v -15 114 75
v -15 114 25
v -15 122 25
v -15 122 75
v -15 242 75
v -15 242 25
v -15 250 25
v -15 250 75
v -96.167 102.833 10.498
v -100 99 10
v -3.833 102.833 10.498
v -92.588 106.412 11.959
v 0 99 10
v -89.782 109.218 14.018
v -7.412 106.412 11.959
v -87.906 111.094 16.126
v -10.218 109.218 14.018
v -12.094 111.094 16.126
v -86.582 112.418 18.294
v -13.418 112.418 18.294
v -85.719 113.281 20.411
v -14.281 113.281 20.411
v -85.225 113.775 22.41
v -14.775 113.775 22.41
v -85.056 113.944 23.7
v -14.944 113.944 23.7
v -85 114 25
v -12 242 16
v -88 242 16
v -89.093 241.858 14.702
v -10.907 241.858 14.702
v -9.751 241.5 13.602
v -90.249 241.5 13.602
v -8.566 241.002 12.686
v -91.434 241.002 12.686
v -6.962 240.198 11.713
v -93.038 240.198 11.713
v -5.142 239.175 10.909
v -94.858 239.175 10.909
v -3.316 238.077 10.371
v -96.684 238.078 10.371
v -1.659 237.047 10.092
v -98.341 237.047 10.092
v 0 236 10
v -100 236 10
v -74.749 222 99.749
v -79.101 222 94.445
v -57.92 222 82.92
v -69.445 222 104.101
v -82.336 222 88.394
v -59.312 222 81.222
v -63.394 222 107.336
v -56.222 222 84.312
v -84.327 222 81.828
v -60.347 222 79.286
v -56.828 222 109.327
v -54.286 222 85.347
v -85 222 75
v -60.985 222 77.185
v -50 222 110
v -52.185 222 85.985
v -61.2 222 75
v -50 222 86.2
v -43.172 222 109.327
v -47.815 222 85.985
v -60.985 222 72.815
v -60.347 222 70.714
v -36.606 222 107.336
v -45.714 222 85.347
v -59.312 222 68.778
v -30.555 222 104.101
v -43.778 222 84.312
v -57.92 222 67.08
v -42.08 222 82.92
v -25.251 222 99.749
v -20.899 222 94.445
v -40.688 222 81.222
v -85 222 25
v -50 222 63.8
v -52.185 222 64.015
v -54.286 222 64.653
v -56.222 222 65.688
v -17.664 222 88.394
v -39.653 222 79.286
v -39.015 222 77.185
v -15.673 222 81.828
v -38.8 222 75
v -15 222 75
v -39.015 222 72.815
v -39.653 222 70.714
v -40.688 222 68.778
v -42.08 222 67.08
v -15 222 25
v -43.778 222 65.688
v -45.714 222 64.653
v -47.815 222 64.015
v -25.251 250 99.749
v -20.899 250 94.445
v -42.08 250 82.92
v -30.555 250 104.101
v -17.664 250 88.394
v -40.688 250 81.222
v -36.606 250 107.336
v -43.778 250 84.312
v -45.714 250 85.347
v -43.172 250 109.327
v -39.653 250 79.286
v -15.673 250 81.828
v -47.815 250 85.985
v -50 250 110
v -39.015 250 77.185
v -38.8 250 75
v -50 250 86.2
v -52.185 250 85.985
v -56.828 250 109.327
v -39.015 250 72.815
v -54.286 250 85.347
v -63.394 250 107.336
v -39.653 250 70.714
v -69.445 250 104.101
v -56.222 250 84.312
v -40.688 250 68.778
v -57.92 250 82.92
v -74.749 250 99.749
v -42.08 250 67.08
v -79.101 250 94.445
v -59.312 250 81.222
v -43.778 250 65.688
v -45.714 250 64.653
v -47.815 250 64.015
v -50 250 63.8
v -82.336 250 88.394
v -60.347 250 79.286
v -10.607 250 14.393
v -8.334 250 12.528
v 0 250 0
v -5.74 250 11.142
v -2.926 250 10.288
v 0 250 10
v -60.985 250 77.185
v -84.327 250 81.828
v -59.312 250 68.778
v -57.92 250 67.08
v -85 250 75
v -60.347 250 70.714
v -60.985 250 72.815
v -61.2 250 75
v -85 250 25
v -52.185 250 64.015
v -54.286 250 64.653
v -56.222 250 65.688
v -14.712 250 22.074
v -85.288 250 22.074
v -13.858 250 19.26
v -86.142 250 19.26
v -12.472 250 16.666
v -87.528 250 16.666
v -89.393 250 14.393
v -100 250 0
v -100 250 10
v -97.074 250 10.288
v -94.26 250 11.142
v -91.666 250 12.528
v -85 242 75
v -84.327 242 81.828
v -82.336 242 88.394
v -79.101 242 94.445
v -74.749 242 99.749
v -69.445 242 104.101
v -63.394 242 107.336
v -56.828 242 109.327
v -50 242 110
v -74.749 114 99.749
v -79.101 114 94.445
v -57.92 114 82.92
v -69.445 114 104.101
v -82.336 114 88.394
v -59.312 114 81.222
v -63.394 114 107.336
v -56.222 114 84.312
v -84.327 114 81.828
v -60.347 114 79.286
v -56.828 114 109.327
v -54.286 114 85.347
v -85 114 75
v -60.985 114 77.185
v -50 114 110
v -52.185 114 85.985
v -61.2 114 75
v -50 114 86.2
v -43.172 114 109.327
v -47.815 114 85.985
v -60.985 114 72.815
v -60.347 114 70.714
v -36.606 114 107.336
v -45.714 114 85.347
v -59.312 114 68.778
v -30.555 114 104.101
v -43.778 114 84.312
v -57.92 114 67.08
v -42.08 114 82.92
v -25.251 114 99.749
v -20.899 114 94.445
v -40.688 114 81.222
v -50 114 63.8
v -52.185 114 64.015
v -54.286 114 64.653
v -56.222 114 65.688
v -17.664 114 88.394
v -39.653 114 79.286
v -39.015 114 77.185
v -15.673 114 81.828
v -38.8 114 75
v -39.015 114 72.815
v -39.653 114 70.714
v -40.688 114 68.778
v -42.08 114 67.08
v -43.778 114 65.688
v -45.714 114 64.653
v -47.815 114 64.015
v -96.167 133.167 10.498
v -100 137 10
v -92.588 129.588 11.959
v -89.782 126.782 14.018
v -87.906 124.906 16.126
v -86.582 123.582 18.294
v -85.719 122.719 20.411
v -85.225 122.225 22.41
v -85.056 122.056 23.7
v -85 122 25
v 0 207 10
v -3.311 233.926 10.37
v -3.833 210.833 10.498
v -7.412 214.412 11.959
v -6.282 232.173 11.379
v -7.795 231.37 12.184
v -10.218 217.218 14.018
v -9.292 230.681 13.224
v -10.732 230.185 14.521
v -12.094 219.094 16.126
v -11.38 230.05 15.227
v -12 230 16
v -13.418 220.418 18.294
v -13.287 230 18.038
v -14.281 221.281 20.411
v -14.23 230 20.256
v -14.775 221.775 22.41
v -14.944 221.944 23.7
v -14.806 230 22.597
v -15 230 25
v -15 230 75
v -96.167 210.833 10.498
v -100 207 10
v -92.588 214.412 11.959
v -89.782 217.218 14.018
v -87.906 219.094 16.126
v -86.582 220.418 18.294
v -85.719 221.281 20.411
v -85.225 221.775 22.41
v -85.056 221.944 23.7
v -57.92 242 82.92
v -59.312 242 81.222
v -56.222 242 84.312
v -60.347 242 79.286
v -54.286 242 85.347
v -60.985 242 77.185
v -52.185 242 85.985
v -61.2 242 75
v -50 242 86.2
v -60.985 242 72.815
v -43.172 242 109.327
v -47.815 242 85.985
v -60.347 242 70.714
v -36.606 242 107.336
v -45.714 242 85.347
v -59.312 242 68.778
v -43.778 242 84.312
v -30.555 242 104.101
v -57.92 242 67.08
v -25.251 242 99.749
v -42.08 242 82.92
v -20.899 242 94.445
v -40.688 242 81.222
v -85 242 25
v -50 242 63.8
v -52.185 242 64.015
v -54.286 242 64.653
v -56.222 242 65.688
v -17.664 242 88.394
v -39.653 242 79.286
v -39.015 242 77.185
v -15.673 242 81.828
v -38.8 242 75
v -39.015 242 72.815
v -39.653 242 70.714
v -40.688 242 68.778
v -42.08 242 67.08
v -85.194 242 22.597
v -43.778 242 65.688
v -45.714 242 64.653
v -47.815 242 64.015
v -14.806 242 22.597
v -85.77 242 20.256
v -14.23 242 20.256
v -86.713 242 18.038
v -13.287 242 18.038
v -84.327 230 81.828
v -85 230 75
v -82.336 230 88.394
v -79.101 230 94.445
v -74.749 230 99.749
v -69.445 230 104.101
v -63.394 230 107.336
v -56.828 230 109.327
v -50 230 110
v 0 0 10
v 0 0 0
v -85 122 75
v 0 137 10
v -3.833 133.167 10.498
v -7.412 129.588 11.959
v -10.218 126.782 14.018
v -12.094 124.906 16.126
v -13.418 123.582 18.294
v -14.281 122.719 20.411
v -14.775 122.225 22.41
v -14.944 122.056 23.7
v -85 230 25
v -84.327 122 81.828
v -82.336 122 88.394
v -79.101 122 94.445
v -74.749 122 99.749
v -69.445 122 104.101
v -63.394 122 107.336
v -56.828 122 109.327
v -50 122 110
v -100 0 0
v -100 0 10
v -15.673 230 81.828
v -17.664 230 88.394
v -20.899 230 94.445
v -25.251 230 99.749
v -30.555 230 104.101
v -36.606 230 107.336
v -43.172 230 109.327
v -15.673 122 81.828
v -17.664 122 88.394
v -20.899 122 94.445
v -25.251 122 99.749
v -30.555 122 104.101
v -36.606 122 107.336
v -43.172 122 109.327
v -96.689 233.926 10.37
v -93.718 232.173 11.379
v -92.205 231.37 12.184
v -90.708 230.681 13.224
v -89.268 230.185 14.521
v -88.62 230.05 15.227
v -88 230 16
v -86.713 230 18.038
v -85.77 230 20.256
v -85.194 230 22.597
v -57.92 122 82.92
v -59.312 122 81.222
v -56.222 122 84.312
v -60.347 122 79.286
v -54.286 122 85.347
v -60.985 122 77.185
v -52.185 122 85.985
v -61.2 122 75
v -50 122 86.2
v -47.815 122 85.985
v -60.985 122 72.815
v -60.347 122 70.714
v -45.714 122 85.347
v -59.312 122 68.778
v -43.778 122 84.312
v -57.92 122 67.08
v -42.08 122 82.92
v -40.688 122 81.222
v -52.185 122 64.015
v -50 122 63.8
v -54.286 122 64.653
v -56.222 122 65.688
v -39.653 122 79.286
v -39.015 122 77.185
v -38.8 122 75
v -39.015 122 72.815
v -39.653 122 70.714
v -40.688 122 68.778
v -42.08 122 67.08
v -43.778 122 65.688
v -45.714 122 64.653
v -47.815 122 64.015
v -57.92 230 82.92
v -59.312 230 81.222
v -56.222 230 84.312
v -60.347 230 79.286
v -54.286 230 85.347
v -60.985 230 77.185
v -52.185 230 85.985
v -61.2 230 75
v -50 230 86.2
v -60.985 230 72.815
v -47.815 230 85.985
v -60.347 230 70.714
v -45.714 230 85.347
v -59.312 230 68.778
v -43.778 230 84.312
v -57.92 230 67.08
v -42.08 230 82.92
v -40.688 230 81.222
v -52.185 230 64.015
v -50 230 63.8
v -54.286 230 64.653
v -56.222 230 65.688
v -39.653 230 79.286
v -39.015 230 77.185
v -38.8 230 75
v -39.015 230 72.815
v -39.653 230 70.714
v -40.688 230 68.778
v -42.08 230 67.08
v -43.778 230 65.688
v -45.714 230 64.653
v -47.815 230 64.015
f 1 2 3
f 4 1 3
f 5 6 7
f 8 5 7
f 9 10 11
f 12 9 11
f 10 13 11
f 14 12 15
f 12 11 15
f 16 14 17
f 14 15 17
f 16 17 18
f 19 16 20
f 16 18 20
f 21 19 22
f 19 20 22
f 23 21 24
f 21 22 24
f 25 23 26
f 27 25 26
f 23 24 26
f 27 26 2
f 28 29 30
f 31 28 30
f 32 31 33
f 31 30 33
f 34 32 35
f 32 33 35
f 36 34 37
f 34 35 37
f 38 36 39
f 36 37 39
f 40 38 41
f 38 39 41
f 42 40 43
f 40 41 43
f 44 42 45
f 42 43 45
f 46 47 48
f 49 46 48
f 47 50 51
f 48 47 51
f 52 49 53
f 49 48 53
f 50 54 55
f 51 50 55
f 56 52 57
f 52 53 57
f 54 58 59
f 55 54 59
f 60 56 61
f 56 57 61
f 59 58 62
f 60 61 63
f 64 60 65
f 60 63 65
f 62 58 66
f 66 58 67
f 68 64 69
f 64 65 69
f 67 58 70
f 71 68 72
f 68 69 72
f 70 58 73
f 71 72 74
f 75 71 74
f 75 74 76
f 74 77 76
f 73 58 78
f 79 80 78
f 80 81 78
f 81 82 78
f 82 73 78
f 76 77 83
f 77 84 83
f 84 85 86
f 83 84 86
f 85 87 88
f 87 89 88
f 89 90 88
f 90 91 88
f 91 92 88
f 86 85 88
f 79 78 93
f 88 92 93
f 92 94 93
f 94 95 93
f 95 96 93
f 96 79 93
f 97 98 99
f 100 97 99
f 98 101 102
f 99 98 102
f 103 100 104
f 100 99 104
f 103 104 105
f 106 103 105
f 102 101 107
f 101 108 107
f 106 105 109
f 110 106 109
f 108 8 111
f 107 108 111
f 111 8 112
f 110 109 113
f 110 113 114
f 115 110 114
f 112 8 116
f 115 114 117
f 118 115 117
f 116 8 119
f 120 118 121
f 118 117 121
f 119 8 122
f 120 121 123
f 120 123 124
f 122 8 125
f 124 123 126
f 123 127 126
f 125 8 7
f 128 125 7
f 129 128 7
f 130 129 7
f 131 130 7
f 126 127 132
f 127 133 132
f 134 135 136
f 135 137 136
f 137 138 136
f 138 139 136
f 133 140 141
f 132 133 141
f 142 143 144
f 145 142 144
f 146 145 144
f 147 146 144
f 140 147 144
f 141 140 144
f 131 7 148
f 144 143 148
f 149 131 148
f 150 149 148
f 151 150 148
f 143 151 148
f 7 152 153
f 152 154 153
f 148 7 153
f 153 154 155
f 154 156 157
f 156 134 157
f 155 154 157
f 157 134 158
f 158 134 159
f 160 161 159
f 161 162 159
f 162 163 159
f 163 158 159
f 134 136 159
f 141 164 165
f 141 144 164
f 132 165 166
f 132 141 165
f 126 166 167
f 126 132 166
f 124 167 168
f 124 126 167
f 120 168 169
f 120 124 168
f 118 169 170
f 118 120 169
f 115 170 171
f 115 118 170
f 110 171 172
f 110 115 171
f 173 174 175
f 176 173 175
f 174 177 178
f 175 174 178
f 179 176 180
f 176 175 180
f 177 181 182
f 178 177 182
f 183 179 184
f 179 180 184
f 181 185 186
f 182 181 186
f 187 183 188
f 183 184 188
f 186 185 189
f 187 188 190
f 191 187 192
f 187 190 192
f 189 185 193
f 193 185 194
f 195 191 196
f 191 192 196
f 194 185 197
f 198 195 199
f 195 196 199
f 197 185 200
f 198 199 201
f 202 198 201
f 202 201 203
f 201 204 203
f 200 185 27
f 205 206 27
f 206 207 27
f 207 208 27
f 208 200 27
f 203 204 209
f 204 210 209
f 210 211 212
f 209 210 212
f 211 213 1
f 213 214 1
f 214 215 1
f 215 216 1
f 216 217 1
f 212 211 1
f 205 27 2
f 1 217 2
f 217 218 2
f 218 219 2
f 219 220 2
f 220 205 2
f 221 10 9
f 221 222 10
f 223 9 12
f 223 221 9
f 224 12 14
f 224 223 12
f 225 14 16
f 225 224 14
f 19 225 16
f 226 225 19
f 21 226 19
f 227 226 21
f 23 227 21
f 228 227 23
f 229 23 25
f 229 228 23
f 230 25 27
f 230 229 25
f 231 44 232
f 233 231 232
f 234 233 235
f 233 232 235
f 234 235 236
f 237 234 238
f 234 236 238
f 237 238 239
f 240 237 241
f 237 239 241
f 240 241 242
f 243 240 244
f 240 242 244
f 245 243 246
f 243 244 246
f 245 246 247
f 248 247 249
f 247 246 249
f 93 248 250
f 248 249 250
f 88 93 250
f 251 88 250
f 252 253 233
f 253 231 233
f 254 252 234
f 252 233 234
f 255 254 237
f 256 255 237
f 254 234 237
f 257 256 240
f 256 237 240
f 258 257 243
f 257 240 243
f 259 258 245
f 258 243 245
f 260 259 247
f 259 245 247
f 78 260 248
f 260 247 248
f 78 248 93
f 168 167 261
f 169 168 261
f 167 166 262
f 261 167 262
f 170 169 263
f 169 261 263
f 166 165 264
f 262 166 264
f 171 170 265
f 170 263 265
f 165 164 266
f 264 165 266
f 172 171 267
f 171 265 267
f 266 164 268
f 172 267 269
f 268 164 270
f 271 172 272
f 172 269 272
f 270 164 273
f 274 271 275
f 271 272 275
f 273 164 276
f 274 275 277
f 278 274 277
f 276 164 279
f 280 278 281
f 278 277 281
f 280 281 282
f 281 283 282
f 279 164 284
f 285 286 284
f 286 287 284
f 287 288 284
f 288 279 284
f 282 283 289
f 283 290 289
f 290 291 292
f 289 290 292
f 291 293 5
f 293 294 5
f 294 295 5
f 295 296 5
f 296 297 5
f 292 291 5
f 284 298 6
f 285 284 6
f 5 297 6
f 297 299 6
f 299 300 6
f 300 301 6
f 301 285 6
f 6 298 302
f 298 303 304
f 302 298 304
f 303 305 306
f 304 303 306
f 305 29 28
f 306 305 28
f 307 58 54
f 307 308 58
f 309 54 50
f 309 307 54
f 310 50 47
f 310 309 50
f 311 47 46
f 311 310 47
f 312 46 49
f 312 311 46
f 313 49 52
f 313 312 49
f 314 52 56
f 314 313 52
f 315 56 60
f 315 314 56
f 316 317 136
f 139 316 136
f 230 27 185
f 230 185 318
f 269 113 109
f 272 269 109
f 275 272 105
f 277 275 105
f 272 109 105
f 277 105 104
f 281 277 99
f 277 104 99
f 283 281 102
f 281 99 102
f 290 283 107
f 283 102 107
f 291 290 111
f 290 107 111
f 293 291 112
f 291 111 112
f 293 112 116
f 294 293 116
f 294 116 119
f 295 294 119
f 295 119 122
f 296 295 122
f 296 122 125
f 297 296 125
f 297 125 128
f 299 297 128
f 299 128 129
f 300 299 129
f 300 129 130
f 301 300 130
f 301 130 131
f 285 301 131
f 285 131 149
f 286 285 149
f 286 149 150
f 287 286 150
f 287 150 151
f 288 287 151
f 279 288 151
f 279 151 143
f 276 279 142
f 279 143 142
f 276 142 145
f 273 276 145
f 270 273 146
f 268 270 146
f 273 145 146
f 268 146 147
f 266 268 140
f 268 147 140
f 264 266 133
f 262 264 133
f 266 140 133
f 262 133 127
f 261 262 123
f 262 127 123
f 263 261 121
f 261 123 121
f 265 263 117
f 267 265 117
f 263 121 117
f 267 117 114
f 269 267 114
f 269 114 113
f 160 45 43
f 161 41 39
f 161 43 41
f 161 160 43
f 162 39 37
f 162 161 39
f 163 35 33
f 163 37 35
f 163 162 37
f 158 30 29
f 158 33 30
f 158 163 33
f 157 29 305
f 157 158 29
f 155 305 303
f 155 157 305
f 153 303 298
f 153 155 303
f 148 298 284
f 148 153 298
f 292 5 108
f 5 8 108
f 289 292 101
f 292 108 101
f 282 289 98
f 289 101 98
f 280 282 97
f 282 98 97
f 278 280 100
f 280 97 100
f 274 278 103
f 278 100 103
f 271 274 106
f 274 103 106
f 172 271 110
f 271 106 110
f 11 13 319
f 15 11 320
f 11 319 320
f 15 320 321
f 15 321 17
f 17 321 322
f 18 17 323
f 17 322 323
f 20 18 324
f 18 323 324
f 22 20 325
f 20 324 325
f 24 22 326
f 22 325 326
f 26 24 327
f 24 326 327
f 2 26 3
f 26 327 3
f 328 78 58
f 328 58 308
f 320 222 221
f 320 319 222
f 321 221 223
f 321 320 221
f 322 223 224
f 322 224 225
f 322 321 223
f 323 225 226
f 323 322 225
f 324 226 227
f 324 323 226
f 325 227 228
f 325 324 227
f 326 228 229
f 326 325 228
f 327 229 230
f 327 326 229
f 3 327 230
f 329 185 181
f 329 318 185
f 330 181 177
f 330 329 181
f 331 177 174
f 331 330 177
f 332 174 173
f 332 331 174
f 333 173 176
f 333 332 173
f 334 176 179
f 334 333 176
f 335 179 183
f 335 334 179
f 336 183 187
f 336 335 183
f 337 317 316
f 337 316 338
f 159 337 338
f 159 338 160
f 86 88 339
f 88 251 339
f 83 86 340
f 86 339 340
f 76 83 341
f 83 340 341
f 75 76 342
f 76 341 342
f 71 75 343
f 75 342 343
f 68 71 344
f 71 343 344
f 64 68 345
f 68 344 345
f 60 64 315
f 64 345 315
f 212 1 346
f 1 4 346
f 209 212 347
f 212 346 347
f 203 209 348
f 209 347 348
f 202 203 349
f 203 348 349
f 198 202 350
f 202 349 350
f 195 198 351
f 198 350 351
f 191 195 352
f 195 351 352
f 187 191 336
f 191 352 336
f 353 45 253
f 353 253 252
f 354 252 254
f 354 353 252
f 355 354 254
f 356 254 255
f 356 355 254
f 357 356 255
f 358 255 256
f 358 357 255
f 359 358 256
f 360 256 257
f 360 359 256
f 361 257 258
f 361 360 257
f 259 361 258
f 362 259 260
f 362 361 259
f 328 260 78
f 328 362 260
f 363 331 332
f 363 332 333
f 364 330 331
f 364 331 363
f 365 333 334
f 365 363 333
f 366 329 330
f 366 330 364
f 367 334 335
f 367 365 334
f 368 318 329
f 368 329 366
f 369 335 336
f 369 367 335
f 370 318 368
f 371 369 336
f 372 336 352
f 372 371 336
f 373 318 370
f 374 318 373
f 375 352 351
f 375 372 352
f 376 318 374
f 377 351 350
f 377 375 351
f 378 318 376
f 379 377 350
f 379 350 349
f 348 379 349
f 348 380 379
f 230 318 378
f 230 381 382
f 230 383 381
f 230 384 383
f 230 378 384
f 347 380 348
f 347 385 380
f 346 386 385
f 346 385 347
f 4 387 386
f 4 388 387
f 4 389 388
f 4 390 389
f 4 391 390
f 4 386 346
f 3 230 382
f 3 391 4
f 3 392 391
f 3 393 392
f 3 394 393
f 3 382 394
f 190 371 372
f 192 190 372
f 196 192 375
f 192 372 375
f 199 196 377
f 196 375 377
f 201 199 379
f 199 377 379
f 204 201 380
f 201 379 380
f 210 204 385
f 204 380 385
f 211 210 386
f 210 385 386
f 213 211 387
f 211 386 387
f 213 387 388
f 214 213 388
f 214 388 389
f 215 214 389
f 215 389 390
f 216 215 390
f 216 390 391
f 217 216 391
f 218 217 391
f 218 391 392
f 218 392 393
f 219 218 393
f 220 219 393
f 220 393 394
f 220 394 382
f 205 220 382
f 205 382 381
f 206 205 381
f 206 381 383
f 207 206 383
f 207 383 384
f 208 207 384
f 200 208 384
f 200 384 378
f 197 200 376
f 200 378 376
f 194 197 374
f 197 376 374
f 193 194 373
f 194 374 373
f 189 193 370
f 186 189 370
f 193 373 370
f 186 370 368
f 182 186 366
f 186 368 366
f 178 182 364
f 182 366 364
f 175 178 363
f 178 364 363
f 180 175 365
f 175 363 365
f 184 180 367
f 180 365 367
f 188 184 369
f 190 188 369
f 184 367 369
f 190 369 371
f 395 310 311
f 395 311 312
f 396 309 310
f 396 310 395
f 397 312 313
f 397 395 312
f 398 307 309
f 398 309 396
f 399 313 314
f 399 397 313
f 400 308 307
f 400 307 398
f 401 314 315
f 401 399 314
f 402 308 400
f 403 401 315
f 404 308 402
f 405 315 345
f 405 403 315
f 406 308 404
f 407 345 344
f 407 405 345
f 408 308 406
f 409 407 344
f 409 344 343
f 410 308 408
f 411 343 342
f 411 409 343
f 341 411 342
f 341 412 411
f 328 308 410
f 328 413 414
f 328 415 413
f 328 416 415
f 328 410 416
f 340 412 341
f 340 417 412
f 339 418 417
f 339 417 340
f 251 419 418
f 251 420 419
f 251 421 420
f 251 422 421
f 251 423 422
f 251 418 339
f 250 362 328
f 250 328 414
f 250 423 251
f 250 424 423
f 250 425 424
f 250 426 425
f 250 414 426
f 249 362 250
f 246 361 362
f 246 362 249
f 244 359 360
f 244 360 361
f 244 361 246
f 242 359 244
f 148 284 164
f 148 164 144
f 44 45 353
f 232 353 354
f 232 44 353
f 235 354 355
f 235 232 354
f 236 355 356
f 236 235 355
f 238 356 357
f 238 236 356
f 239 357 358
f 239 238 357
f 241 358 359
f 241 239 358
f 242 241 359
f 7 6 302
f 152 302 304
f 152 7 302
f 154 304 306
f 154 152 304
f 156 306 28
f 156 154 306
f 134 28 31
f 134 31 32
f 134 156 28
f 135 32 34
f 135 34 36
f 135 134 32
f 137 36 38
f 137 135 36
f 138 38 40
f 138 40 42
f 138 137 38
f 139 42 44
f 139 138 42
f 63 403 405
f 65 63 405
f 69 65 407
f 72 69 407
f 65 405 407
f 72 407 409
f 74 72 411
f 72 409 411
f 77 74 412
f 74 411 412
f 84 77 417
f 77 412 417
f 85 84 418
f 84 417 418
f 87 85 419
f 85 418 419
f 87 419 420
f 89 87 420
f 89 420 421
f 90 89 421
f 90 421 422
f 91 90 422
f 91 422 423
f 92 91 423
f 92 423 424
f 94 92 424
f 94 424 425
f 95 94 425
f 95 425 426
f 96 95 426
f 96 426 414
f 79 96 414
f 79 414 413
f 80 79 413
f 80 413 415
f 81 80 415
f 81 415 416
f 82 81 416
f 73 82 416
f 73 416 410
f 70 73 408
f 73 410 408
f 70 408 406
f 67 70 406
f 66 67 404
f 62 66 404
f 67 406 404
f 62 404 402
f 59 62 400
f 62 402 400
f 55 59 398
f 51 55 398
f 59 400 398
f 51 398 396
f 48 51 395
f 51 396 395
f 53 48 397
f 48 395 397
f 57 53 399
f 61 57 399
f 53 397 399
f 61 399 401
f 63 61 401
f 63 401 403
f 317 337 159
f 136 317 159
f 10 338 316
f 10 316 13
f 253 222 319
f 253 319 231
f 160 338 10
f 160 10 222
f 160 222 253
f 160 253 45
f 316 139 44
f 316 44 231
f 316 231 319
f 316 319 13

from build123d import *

# Parameters (mm, degrees)
ESQUISSE1_W             = 250
ESQUISSE1_H             = 100
BOSS_EXTRU_1_DEPTH      = 10
ESQUISSE2_W             = 70
ESQUISSE2_H             = 8
BOSS_EXTRU_2_DEPTH      = 100
CONG_1_R                = 35
ESQUISSE3_R             = 11.2
ENL_V_MAT_EXTRU_1_DEPTH = 150
CONG_2_R                = 15
CONG_3_R                = 6


with BuildPart() as part:
    # Esquisse1 → Boss.-Extru.1 (new body)
    with BuildSketch(Plane(origin=(0, 0, 0), x_dir=(0, 1, 0), z_dir=(0, 0, 1))):
        with Locations((125, 50)):
            Rectangle(ESQUISSE1_W, ESQUISSE1_H)
    extrude(amount=BOSS_EXTRU_1_DEPTH)

    # Esquisse2 → Boss.-Extru.2 (add)
    with BuildSketch(Plane.XY.offset(10)):
        with Locations((-50, 226)):
            Rectangle(ESQUISSE2_W, ESQUISSE2_H)
        with Locations((-50, 246)):
            Rectangle(ESQUISSE2_W, ESQUISSE2_H)
        with Locations((-50, 118)):
            Rectangle(ESQUISSE2_W, ESQUISSE2_H)
    extrude(amount=BOSS_EXTRU_2_DEPTH)

    # Congé1
    cong_1_edges = [part.edges().sort_by_distance(p)[0] for p in [
        (-85, 226, 110),
        (-15, 226, 110),
        (-15, 118, 110),
        (-85, 118, 110),
        (-85, 246, 110),
        (-15, 246, 110),
    ]]
    fillet(cong_1_edges, radius=CONG_1_R - 0.0001)  # a hair under: the kernel refuses the full size

    # Esquisse3 → Enlèv. mat.-Extru.1 (cut)
    with BuildSketch(Plane(origin=(0, 250, 0), x_dir=(-1, 0, 0), z_dir=(0, 1, 0))):
        with Locations(Location((50, 75, 0), (0, 0, 90))):
            Circle(ESQUISSE3_R)
    extrude(amount=-ENL_V_MAT_EXTRU_1_DEPTH, mode=Mode.SUBTRACT)

    # Congé2
    cong_2_edges = [part.edges().sort_by_distance(p)[0] for p in [
        (-15, 118, 10),
        (-50, 122, 10),
        (-85, 118, 10),
        (-50, 114, 10),
        (-85, 246, 10),
        (-15, 246, 10),
        (-15, 226, 10),
        (-50, 222, 10),
        (-85, 226, 10),
    ]]
    fillet(cong_2_edges, radius=CONG_2_R - 0.0001)  # a hair under: the kernel refuses the full size

    # Congé3
    cong_3_edges = [part.edges().sort_by_distance(p)[0] for p in [
        (-50, 242, 10),
        (-50, 230, 10),
    ]]
    fillet(cong_3_edges, radius=CONG_3_R - 0.0001)  # a hair under: the kernel refuses the full size


solid = part.part
